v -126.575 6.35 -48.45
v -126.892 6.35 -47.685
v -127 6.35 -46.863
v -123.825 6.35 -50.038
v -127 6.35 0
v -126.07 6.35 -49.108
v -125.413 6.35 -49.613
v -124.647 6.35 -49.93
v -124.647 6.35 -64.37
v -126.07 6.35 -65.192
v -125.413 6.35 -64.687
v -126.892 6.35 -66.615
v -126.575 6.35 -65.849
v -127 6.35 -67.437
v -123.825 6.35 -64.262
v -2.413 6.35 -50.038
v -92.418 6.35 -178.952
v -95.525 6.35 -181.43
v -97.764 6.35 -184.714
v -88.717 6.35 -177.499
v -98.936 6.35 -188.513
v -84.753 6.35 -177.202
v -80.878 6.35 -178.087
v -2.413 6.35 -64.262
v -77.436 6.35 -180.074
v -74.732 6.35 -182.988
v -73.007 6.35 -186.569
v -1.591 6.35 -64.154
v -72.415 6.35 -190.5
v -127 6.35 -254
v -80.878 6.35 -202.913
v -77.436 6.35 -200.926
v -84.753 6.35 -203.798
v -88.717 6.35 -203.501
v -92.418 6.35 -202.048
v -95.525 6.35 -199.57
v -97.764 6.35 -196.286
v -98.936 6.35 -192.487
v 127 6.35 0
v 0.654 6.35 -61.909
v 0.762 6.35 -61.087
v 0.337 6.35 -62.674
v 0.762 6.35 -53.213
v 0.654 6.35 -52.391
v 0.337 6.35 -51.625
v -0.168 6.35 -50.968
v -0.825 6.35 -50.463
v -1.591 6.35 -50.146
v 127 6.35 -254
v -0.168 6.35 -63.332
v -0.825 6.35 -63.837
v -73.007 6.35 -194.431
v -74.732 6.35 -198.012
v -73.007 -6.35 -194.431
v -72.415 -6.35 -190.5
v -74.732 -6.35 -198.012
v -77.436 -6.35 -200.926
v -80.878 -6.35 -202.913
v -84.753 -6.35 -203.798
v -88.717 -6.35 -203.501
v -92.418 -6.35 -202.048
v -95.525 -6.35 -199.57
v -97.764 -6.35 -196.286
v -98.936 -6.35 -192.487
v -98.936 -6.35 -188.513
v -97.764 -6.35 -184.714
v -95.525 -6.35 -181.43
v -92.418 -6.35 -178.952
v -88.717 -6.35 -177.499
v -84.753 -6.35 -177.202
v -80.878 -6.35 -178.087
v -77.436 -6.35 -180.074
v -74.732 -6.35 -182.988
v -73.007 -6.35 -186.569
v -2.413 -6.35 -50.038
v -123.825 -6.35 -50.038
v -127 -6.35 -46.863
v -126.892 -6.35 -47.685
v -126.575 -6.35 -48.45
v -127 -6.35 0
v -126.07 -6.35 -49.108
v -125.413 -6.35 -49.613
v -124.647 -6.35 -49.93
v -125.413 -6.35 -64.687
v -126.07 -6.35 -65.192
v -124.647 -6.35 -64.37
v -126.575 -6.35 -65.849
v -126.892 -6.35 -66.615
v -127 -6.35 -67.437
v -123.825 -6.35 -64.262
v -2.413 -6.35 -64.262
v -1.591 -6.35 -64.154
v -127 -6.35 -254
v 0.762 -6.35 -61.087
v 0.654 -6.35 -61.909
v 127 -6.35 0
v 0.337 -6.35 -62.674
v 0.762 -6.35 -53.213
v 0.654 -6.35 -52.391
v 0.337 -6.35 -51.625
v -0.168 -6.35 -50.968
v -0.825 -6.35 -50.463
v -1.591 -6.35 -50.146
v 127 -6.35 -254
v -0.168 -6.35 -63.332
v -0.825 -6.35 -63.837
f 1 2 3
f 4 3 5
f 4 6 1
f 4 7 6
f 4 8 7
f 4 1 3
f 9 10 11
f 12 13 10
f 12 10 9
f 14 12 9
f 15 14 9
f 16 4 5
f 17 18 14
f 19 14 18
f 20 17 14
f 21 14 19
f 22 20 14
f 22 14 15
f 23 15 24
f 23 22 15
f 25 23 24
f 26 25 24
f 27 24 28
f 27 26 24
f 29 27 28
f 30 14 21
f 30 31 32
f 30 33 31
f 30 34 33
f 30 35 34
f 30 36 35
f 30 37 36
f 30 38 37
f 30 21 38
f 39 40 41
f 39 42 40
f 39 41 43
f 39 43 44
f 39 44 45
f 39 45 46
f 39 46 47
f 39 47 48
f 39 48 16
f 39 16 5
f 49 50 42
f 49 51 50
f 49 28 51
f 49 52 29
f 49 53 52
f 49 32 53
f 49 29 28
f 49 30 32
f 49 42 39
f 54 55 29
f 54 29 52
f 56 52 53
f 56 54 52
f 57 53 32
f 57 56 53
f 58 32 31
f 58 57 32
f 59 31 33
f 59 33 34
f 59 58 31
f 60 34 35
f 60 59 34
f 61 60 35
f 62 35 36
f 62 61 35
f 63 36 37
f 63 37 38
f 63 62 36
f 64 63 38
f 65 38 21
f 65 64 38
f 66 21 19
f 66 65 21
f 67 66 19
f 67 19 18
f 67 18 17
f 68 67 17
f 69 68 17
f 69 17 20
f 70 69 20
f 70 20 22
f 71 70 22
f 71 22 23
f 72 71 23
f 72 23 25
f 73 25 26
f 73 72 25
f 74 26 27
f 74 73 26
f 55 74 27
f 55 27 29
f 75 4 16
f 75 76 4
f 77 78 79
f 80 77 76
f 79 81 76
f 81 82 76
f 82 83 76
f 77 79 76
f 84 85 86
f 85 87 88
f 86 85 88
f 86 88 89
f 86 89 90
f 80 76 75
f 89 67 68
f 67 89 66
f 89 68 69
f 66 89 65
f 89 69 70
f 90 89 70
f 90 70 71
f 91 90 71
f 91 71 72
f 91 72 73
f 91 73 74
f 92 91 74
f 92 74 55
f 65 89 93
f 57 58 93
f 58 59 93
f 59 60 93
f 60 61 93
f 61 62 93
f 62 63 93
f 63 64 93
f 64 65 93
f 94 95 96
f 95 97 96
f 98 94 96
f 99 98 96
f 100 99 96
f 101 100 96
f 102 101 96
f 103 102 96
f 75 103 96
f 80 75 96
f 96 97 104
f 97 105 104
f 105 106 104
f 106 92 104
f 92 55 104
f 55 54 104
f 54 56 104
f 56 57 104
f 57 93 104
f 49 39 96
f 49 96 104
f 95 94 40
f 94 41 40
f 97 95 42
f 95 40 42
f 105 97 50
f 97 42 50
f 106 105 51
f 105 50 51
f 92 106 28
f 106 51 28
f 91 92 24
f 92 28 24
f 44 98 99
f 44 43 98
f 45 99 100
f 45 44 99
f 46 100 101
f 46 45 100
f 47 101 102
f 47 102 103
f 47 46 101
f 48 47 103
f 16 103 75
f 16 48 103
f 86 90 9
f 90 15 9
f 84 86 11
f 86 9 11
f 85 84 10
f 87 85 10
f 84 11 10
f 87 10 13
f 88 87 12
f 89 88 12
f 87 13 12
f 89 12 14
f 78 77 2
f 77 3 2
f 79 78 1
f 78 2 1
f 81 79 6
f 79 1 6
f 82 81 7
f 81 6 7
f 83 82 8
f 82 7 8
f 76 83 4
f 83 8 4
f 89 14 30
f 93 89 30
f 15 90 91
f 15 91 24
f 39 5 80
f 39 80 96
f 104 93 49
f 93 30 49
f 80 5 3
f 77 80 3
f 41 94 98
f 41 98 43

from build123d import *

# Parameters (mm, degrees)
SKETCH1_W               = 254
SKETCH1_H               = 254
BOSS_EXTRUDE1_DEPTH     = 6.35
CAVITY1_START           = -6.35
CAVITY1_OUTLINE_R       = 12.7
CAVITY1_DEPTH           = 12.7
CUT_EXTRUDE2_DEPTH      = 285.051619429
CUT_EXTRUDE2_DEPTH_BACK = 285.051619429
SKETCH3_W               = 127
SKETCH3_H               = 12.7
MOVE_FACE_SLOT_BY       = 0.762
MOVE_FACE_SLOT_2_BY     = 0.762
MOVE_FACE_SLOT_3_BY     = 0.762
FILLET1_R               = 3.175
MOVE_FACE_HOLE_BY       = 0.635


# Read off the part's stored shape, not the designer's step: Cavity1
with BuildPart() as part:
    # Sketch1 → Boss-Extrude1 (new, symmetric)
    with BuildSketch(Plane(origin=(0, 0, 0), x_dir=(1, 0, 0), z_dir=(0, 1, 0))):
        with Locations((0, 127)):
            Rectangle(SKETCH1_W, SKETCH1_H)
    extrude(amount=BOSS_EXTRUDE1_DEPTH, both=True)

    # Cavity1 outline → Cavity1 (cut)
    with BuildSketch(Plane(origin=(0, 0, 0), x_dir=(1, 0, 0), z_dir=(0, 1, 0)).offset(CAVITY1_START)):
        with Locations((-85.75, 190.5)):
            Circle(CAVITY1_OUTLINE_R)
    extrude(amount=CAVITY1_DEPTH, mode=Mode.SUBTRACT)

    # Sketch3 → Cut-Extrude2 (cut, two sides: drawn at the far end of the back side and taken through both)
    with BuildSketch(Plane(origin=(0, 0, 0), x_dir=(1, 0, 0), z_dir=(0, 1, 0)).offset(-CUT_EXTRUDE2_DEPTH_BACK)):
        with Locations((-63.5, 57.15)):
            Rectangle(SKETCH3_W, SKETCH3_H)
    extrude(amount=CUT_EXTRUDE2_DEPTH + CUT_EXTRUDE2_DEPTH_BACK, mode=Mode.SUBTRACT)

    # Move Face slot: a face moved inward by 0.762
    extrude(part.faces().sort_by_distance((0, 0, -57.15))[0], amount=MOVE_FACE_SLOT_BY, dir=(1, 0, 0), mode=Mode.SUBTRACT)

    # Move Face slot 2: a face moved inward by 0.762
    extrude(part.faces().sort_by_distance((-63.5, 0, -63.5))[0], amount=MOVE_FACE_SLOT_2_BY, dir=(0, 0, -1), mode=Mode.SUBTRACT)

    # Move Face slot 3: a face moved inward by 0.762
    extrude(part.faces().sort_by_distance((-63.5, 0, -50.8))[0], amount=MOVE_FACE_SLOT_3_BY, dir=(0, 0, 1), mode=Mode.SUBTRACT)

    # Fillet1
    fillet1_edges = [part.edges().sort_by_distance(p)[0] for p in [
        (-127, 0, -50.038),
        (-127, 0, -64.262),
        (0.762, 0, -64.262),
        (0.762, 0, -50.038),
    ]]
    fillet(fillet1_edges, radius=FILLET1_R)

    # Move Face hole: a curved face moved inward by 0.635
    add(Solid.thicken(part.faces().sort_by_distance((-98.45, 0, -190.5))[0], -MOVE_FACE_HOLE_BY), mode=Mode.SUBTRACT)


solid = part.part
